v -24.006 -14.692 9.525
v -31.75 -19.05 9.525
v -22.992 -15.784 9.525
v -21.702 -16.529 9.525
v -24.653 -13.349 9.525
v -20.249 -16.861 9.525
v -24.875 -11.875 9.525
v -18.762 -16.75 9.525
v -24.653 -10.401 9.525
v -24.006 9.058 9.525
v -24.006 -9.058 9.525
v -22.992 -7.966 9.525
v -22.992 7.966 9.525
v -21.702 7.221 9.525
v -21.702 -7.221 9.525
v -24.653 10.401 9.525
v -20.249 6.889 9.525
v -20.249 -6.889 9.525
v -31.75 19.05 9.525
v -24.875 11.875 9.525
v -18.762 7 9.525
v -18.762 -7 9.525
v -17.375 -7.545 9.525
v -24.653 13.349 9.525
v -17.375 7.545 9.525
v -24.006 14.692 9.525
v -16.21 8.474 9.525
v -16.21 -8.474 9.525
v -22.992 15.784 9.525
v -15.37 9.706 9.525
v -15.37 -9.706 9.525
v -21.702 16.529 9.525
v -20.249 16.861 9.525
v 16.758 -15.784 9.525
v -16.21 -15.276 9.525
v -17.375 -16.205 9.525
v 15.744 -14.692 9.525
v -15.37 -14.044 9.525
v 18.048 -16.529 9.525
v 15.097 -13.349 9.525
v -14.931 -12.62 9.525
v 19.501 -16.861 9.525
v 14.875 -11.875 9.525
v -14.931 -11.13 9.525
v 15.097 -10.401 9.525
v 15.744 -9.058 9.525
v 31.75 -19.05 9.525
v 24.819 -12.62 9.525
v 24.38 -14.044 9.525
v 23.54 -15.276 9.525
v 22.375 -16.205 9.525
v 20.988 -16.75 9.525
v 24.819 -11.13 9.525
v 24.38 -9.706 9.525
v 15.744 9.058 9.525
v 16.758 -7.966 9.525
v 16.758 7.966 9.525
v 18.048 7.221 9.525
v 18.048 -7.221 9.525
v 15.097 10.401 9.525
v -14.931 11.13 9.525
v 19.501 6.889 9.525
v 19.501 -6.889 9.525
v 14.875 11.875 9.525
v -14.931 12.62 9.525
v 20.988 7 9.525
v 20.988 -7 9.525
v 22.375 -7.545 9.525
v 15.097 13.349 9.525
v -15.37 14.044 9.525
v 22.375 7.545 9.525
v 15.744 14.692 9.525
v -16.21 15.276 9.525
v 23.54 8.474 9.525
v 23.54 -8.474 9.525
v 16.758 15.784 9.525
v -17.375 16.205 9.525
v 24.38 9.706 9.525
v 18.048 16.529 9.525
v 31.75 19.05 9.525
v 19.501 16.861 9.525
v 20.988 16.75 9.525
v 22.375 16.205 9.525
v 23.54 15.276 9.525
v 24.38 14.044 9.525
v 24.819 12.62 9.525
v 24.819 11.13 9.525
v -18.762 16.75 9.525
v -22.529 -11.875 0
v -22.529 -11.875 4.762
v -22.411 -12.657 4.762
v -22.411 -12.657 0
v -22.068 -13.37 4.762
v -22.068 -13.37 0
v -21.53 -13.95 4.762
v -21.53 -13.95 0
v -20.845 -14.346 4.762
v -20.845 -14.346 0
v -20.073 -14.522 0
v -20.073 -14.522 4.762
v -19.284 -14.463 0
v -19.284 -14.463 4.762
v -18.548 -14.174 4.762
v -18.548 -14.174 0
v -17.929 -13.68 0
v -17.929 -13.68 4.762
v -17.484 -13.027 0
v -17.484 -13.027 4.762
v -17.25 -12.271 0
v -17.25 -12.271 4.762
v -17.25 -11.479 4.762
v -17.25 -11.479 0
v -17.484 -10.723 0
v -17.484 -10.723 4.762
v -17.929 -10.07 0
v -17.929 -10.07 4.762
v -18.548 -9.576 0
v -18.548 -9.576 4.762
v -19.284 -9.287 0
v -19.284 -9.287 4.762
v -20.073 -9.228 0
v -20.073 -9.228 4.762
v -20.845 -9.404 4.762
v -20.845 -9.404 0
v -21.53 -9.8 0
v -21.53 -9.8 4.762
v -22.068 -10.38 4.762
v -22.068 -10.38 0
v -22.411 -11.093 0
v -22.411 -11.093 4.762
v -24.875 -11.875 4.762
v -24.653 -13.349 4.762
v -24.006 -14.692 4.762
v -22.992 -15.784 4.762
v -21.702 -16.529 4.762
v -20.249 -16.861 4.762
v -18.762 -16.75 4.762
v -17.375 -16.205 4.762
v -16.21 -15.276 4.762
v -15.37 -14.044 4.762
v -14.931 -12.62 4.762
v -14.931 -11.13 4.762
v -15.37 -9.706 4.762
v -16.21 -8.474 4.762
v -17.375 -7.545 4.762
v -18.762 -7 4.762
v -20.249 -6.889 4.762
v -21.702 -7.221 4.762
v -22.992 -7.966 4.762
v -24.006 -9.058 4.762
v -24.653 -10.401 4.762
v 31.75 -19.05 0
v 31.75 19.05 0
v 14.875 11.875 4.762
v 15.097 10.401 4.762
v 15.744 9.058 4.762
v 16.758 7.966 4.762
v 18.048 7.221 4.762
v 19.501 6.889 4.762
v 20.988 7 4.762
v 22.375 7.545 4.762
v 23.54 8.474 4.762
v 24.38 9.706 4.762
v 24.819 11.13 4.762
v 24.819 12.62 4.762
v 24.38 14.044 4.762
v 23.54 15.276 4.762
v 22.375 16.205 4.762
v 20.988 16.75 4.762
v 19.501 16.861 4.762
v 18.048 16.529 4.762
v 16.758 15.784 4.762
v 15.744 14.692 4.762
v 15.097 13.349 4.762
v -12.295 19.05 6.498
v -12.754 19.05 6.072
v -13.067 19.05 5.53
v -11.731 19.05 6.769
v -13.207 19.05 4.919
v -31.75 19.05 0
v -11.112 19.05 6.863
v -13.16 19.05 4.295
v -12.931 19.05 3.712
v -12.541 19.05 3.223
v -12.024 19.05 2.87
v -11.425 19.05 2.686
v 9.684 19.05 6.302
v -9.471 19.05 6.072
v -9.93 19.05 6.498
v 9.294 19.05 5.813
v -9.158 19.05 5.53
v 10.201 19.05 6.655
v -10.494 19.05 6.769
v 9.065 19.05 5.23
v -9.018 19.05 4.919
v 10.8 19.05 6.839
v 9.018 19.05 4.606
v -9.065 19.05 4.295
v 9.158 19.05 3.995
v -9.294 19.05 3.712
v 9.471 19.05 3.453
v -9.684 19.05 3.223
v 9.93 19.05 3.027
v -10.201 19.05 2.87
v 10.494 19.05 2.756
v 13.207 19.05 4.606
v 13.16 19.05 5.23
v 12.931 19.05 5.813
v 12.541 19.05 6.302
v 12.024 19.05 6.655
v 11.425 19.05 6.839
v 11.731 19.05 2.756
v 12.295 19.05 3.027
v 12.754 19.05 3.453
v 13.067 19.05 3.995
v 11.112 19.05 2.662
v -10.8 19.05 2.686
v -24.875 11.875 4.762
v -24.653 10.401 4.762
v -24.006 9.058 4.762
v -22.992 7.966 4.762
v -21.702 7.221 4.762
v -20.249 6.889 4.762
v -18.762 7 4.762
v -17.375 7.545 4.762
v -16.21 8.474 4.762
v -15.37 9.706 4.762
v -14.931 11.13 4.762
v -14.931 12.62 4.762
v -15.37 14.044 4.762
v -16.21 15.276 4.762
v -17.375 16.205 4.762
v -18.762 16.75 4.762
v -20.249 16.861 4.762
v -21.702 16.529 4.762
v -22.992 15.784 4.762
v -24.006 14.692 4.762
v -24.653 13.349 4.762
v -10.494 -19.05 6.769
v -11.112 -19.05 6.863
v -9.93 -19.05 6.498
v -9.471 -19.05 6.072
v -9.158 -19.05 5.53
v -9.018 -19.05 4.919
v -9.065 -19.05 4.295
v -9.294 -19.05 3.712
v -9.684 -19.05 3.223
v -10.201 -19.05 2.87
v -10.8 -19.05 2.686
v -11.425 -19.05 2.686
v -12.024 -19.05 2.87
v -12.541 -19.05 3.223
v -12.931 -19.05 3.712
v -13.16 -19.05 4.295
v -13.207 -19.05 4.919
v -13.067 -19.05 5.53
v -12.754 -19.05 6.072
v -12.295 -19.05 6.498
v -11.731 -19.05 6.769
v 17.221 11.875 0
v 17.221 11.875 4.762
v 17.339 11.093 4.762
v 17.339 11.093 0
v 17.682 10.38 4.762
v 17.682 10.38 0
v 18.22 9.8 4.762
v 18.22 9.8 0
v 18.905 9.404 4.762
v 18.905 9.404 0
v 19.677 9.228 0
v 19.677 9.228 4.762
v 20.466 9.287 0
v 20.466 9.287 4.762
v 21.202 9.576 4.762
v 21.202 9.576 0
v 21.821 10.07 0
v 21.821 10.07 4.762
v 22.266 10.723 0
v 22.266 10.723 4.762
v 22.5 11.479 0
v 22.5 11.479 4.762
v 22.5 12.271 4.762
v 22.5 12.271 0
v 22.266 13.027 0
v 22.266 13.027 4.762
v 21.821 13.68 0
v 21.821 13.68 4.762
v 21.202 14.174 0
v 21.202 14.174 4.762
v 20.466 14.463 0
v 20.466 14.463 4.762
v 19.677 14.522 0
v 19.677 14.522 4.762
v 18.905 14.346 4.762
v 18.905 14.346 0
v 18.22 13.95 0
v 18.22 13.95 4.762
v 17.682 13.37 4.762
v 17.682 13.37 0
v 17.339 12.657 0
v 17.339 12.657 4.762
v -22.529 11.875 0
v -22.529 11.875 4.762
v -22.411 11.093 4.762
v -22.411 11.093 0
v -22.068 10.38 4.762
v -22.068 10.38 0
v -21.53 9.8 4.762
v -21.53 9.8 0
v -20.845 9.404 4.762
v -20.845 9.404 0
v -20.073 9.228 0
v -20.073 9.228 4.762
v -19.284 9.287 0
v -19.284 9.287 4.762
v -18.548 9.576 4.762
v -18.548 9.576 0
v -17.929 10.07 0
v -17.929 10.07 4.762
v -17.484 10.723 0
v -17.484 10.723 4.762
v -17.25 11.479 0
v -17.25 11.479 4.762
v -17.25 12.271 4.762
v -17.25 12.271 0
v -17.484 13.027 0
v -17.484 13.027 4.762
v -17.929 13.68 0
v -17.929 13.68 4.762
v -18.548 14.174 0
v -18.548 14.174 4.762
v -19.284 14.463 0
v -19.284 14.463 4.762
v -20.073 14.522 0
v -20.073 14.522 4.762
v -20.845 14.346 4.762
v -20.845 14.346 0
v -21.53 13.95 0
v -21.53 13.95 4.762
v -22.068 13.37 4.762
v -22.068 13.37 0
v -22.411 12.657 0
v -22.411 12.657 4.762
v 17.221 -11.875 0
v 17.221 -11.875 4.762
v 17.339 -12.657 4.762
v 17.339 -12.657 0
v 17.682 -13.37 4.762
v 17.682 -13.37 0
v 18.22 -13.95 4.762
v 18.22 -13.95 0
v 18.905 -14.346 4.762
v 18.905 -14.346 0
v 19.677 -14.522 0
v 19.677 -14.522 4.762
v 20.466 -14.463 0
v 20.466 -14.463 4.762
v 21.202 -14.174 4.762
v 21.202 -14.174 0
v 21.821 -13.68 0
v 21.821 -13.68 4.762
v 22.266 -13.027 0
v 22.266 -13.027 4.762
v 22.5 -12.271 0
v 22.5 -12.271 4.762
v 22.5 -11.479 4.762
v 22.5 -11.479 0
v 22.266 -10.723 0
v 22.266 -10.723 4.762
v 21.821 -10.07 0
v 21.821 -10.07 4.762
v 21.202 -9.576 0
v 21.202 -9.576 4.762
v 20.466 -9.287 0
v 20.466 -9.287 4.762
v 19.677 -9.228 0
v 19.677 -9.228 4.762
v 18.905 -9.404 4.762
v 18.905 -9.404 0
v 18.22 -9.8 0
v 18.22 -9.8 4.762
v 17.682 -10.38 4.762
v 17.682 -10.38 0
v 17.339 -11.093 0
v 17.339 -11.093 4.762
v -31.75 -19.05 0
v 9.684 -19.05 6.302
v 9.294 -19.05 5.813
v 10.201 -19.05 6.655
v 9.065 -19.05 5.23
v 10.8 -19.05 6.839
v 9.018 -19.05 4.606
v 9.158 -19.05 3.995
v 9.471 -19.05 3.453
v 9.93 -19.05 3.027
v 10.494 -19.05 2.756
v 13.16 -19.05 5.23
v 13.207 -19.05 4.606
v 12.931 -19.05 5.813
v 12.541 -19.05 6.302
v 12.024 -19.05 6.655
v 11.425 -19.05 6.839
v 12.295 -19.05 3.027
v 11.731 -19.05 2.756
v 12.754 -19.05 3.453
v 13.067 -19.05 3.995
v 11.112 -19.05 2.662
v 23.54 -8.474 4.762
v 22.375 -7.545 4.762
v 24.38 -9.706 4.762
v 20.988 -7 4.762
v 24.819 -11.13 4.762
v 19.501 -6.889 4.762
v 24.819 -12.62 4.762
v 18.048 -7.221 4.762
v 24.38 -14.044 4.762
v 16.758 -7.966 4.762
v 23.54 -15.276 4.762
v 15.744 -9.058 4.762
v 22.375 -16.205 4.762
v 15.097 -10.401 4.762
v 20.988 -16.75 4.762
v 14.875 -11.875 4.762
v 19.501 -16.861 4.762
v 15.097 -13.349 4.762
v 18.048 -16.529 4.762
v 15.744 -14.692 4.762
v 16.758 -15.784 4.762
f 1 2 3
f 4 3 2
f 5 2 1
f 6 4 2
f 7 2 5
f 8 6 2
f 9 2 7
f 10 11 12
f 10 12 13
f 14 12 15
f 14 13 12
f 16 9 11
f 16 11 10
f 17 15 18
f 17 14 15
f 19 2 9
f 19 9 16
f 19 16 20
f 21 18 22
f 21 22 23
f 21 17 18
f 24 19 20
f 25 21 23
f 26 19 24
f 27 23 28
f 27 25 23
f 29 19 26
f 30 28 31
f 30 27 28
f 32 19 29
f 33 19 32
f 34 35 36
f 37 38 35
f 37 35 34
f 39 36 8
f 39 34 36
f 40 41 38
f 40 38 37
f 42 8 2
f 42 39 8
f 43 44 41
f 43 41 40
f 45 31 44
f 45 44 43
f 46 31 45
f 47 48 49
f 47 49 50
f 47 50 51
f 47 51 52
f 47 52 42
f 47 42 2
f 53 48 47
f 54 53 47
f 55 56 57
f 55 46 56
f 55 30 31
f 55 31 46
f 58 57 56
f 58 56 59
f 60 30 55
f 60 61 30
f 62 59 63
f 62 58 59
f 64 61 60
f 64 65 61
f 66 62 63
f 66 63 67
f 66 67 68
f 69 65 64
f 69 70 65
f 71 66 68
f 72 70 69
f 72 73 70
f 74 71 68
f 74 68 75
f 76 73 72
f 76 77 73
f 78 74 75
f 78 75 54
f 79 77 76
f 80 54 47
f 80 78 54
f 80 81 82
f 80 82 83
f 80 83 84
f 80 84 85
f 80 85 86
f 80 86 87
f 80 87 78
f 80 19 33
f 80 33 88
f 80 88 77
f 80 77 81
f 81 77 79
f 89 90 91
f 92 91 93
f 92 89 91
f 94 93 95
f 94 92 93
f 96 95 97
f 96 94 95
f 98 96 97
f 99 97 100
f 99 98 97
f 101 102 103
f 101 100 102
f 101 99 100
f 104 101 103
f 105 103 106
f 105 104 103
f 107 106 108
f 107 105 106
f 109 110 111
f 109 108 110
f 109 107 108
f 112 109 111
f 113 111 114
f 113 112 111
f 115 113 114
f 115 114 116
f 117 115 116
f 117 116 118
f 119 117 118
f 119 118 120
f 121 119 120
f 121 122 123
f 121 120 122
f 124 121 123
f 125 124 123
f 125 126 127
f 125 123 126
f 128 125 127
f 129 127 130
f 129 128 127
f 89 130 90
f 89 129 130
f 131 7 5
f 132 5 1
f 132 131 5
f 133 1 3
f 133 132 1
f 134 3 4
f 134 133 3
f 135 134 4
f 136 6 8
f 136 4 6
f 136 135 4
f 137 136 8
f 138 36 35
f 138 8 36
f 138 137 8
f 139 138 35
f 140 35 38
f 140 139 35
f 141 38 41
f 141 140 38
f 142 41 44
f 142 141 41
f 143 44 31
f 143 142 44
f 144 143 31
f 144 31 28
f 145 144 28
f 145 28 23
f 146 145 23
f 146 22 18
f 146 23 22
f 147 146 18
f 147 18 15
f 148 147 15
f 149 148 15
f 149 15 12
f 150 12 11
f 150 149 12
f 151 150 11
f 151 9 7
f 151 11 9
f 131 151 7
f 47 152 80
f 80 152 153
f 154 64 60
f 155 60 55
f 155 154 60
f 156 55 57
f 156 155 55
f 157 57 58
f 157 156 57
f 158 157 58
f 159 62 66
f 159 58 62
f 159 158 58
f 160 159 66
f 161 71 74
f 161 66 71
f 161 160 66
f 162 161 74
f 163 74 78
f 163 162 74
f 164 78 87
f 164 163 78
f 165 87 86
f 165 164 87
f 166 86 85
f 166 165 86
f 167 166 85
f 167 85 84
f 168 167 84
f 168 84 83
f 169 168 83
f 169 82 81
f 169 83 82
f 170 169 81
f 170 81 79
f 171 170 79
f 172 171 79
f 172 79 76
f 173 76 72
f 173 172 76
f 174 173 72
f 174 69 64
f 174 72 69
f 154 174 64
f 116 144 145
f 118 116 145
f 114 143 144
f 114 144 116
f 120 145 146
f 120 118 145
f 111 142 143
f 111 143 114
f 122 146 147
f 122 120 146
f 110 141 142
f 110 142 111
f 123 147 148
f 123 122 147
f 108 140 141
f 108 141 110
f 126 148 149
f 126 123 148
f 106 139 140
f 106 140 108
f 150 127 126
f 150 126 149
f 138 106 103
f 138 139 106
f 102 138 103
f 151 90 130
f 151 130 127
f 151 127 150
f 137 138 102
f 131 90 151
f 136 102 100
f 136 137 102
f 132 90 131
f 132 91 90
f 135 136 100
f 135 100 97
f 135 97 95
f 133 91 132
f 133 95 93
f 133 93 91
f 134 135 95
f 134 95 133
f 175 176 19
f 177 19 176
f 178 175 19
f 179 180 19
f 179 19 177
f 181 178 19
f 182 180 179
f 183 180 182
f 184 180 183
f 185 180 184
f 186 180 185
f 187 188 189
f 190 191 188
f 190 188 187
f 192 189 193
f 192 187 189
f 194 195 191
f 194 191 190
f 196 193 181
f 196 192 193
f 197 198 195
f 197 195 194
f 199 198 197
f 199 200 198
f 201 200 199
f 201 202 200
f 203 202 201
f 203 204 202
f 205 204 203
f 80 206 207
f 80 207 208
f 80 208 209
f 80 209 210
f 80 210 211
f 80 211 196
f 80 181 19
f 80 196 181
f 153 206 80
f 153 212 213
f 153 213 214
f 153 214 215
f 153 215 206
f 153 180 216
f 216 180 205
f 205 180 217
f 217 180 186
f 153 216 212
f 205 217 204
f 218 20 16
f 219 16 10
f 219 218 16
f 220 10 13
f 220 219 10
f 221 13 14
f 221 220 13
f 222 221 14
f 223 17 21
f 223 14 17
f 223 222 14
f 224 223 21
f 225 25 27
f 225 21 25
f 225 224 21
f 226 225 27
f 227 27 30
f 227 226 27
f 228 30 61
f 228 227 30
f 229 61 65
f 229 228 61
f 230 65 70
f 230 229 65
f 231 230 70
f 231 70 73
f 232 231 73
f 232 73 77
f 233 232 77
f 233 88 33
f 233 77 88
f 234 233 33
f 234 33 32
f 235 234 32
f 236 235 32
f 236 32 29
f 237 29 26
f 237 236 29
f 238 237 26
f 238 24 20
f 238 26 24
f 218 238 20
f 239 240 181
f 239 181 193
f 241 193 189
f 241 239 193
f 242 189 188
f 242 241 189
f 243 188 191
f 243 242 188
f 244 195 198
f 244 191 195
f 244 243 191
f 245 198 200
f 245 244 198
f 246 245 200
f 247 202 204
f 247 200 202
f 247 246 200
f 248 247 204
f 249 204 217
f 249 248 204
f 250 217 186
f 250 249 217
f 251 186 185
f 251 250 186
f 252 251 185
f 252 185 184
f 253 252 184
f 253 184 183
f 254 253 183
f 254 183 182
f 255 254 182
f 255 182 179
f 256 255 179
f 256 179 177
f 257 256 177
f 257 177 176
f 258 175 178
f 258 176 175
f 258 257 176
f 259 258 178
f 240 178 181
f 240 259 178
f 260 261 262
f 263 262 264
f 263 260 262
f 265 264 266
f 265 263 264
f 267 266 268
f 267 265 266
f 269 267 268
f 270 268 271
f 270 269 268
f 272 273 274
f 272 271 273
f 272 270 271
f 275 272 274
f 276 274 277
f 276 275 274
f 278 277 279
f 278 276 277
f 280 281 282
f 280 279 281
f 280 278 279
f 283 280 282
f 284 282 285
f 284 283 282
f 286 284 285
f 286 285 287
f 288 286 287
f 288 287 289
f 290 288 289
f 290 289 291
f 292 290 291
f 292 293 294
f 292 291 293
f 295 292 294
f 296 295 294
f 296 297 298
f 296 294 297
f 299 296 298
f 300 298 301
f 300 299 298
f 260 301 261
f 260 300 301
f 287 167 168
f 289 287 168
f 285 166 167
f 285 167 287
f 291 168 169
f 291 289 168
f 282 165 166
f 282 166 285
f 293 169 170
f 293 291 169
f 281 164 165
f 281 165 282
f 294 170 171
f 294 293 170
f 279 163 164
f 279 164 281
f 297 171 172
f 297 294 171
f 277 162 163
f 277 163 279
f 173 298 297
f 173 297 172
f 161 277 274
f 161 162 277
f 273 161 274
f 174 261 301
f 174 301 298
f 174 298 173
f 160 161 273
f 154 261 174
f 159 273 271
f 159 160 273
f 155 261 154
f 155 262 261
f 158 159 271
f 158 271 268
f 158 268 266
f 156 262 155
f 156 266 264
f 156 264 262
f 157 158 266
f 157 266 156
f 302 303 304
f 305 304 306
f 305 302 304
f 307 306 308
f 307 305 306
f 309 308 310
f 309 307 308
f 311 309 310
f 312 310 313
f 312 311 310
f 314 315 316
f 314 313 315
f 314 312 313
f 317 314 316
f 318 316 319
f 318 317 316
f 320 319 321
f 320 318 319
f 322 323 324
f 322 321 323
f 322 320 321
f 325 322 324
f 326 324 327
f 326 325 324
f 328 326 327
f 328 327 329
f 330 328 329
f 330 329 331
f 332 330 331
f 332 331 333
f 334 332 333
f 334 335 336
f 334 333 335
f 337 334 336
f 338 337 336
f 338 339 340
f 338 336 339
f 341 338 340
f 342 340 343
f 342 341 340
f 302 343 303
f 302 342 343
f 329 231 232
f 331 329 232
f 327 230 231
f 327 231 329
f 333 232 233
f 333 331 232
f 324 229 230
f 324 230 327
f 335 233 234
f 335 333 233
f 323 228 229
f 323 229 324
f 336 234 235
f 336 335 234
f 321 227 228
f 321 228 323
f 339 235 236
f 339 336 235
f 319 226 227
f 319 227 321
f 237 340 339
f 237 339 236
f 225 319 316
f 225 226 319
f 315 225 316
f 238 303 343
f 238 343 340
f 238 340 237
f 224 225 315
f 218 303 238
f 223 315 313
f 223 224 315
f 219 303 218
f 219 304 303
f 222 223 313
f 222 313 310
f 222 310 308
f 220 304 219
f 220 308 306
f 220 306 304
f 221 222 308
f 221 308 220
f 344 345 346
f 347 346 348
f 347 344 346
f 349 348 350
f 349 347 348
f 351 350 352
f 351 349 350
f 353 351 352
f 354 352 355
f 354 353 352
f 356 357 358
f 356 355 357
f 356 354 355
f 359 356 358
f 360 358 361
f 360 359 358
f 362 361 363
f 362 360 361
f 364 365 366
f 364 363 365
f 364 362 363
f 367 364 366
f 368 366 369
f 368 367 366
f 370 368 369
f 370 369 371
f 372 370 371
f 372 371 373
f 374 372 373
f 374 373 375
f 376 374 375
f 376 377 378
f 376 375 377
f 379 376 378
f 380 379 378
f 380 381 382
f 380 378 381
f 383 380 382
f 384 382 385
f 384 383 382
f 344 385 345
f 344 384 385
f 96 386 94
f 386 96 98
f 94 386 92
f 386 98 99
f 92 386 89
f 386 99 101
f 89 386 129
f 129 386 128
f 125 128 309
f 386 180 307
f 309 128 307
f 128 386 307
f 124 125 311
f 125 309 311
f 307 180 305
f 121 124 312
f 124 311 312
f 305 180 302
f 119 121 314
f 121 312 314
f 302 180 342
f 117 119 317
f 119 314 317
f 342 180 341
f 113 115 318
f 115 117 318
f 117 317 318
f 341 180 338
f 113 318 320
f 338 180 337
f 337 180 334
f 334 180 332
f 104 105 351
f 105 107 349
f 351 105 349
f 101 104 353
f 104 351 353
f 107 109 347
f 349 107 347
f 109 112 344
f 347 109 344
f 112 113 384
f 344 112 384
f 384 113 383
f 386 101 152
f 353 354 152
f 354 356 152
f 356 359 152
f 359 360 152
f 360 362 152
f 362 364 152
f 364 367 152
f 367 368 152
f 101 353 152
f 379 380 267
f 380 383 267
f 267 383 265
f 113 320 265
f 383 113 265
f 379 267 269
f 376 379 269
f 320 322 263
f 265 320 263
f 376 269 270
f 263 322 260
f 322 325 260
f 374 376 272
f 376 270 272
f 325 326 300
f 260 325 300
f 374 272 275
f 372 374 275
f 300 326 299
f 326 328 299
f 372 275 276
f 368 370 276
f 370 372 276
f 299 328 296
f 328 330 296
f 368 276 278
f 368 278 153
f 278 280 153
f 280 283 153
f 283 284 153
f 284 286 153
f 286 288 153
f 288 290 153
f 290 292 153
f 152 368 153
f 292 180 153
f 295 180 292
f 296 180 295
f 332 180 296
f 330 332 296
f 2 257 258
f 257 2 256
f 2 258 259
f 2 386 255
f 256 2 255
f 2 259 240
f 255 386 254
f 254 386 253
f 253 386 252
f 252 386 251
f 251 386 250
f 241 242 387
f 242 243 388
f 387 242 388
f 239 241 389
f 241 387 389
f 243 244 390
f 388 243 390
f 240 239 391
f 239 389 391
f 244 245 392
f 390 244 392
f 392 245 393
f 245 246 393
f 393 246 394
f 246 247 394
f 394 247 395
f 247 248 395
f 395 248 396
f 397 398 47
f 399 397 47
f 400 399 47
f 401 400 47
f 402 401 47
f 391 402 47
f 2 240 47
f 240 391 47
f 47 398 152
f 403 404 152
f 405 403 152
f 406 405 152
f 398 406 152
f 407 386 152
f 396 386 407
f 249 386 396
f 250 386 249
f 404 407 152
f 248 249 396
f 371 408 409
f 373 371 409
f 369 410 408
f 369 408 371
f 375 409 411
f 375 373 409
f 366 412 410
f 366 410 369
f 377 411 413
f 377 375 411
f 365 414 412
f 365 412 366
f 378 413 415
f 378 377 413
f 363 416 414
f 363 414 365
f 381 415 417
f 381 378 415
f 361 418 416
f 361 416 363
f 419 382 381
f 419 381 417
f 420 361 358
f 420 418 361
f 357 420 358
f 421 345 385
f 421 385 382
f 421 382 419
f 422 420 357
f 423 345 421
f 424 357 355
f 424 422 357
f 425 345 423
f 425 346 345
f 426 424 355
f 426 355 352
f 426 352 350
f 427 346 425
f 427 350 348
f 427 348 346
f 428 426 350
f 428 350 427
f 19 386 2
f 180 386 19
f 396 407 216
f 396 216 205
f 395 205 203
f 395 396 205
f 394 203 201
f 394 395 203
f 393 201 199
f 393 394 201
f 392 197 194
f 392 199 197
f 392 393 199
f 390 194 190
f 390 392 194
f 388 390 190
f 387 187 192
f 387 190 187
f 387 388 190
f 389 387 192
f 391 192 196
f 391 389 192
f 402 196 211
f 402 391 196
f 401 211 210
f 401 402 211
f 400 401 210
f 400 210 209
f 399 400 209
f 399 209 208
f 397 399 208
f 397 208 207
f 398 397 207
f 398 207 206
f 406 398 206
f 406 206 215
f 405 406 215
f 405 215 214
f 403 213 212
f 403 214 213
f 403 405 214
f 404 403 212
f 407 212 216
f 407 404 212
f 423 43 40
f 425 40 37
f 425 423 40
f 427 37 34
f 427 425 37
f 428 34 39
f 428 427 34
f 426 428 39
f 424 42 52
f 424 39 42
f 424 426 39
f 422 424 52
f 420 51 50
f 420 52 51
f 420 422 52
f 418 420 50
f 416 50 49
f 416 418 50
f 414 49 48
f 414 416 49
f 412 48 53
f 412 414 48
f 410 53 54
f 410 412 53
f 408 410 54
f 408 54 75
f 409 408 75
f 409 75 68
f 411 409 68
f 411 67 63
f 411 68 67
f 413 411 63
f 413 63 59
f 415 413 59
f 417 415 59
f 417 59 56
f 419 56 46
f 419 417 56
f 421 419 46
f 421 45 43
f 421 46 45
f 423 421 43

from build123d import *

# Parameters (mm, degrees)
SKETCH1_W               = 63.5
SKETCH1_H               = 38.1
SKETCH1_R               = 2.6543
BOSS_EXTRUDE1_DEPTH     = 9.525
CUT_EXTRUDE2_DEPTH      = 39.232062788
CUT_EXTRUDE2_DEPTH_BACK = 4.7625
SKETCH4_R               = 5
CUT_EXTRUDE3_DEPTH      = 39.232062788
CUT_EXTRUDE3_DEPTH_BACK = 39.232062788
SKETCH5_R               = 2.1


with BuildPart() as part:
    # Sketch1 → Boss-Extrude1 (new body)
    with BuildSketch(Plane.XY):
        Rectangle(SKETCH1_W, SKETCH1_H)
        with Locations(Location((-19.875, 11.875, 0), (0, 0, 180))):
            Circle(SKETCH1_R, mode=Mode.SUBTRACT)
        with Locations(Location((-19.875, -11.875, 0), (0, 0, 180))):
            Circle(SKETCH1_R, mode=Mode.SUBTRACT)
        with Locations(Location((19.875, -11.875, 0), (0, 0, 180))):
            Circle(SKETCH1_R, mode=Mode.SUBTRACT)
        with Locations(Location((19.875, 11.875, 0), (0, 0, 180))):
            Circle(SKETCH1_R, mode=Mode.SUBTRACT)
    extrude(amount=BOSS_EXTRUDE1_DEPTH)

    # Sketch4 → Cut-Extrude2 (cut, two sides: drawn at the far end of the back side and taken through both)
    with BuildSketch(Plane.XY.offset(9.525).offset(-CUT_EXTRUDE2_DEPTH_BACK)):
        with Locations(Location((19.875, -11.875, 0), (0, 0, 180))):
            Circle(SKETCH4_R)
        with Locations(Location((19.875, 11.875, 0), (0, 0, 180))):
            Circle(SKETCH4_R)
        with Locations(Location((-19.875, 11.875, 0), (0, 0, 180))):
            Circle(SKETCH4_R)
        with Locations(Location((-19.875, -11.875, 0), (0, 0, 180))):
            Circle(SKETCH4_R)
    extrude(amount=CUT_EXTRUDE2_DEPTH + CUT_EXTRUDE2_DEPTH_BACK, mode=Mode.SUBTRACT)

    # Sketch5 → Cut-Extrude3 (cut, two sides: drawn at the far end of the back side and taken through both)
    with BuildSketch(Plane(origin=(0, 0, 0), x_dir=(1, 0, 0), z_dir=(0, 1, 0)).offset(-CUT_EXTRUDE3_DEPTH_BACK)):
        with Locations(Location((-11.1125, -4.7625, 0), (0, 0, 270))):
            Circle(SKETCH5_R)
        with Locations(Location((11.1125, -4.7625, 0), (0, 0, 90))):
            Circle(SKETCH5_R)
    extrude(amount=CUT_EXTRUDE3_DEPTH + CUT_EXTRUDE3_DEPTH_BACK, mode=Mode.SUBTRACT)


solid = part.part
